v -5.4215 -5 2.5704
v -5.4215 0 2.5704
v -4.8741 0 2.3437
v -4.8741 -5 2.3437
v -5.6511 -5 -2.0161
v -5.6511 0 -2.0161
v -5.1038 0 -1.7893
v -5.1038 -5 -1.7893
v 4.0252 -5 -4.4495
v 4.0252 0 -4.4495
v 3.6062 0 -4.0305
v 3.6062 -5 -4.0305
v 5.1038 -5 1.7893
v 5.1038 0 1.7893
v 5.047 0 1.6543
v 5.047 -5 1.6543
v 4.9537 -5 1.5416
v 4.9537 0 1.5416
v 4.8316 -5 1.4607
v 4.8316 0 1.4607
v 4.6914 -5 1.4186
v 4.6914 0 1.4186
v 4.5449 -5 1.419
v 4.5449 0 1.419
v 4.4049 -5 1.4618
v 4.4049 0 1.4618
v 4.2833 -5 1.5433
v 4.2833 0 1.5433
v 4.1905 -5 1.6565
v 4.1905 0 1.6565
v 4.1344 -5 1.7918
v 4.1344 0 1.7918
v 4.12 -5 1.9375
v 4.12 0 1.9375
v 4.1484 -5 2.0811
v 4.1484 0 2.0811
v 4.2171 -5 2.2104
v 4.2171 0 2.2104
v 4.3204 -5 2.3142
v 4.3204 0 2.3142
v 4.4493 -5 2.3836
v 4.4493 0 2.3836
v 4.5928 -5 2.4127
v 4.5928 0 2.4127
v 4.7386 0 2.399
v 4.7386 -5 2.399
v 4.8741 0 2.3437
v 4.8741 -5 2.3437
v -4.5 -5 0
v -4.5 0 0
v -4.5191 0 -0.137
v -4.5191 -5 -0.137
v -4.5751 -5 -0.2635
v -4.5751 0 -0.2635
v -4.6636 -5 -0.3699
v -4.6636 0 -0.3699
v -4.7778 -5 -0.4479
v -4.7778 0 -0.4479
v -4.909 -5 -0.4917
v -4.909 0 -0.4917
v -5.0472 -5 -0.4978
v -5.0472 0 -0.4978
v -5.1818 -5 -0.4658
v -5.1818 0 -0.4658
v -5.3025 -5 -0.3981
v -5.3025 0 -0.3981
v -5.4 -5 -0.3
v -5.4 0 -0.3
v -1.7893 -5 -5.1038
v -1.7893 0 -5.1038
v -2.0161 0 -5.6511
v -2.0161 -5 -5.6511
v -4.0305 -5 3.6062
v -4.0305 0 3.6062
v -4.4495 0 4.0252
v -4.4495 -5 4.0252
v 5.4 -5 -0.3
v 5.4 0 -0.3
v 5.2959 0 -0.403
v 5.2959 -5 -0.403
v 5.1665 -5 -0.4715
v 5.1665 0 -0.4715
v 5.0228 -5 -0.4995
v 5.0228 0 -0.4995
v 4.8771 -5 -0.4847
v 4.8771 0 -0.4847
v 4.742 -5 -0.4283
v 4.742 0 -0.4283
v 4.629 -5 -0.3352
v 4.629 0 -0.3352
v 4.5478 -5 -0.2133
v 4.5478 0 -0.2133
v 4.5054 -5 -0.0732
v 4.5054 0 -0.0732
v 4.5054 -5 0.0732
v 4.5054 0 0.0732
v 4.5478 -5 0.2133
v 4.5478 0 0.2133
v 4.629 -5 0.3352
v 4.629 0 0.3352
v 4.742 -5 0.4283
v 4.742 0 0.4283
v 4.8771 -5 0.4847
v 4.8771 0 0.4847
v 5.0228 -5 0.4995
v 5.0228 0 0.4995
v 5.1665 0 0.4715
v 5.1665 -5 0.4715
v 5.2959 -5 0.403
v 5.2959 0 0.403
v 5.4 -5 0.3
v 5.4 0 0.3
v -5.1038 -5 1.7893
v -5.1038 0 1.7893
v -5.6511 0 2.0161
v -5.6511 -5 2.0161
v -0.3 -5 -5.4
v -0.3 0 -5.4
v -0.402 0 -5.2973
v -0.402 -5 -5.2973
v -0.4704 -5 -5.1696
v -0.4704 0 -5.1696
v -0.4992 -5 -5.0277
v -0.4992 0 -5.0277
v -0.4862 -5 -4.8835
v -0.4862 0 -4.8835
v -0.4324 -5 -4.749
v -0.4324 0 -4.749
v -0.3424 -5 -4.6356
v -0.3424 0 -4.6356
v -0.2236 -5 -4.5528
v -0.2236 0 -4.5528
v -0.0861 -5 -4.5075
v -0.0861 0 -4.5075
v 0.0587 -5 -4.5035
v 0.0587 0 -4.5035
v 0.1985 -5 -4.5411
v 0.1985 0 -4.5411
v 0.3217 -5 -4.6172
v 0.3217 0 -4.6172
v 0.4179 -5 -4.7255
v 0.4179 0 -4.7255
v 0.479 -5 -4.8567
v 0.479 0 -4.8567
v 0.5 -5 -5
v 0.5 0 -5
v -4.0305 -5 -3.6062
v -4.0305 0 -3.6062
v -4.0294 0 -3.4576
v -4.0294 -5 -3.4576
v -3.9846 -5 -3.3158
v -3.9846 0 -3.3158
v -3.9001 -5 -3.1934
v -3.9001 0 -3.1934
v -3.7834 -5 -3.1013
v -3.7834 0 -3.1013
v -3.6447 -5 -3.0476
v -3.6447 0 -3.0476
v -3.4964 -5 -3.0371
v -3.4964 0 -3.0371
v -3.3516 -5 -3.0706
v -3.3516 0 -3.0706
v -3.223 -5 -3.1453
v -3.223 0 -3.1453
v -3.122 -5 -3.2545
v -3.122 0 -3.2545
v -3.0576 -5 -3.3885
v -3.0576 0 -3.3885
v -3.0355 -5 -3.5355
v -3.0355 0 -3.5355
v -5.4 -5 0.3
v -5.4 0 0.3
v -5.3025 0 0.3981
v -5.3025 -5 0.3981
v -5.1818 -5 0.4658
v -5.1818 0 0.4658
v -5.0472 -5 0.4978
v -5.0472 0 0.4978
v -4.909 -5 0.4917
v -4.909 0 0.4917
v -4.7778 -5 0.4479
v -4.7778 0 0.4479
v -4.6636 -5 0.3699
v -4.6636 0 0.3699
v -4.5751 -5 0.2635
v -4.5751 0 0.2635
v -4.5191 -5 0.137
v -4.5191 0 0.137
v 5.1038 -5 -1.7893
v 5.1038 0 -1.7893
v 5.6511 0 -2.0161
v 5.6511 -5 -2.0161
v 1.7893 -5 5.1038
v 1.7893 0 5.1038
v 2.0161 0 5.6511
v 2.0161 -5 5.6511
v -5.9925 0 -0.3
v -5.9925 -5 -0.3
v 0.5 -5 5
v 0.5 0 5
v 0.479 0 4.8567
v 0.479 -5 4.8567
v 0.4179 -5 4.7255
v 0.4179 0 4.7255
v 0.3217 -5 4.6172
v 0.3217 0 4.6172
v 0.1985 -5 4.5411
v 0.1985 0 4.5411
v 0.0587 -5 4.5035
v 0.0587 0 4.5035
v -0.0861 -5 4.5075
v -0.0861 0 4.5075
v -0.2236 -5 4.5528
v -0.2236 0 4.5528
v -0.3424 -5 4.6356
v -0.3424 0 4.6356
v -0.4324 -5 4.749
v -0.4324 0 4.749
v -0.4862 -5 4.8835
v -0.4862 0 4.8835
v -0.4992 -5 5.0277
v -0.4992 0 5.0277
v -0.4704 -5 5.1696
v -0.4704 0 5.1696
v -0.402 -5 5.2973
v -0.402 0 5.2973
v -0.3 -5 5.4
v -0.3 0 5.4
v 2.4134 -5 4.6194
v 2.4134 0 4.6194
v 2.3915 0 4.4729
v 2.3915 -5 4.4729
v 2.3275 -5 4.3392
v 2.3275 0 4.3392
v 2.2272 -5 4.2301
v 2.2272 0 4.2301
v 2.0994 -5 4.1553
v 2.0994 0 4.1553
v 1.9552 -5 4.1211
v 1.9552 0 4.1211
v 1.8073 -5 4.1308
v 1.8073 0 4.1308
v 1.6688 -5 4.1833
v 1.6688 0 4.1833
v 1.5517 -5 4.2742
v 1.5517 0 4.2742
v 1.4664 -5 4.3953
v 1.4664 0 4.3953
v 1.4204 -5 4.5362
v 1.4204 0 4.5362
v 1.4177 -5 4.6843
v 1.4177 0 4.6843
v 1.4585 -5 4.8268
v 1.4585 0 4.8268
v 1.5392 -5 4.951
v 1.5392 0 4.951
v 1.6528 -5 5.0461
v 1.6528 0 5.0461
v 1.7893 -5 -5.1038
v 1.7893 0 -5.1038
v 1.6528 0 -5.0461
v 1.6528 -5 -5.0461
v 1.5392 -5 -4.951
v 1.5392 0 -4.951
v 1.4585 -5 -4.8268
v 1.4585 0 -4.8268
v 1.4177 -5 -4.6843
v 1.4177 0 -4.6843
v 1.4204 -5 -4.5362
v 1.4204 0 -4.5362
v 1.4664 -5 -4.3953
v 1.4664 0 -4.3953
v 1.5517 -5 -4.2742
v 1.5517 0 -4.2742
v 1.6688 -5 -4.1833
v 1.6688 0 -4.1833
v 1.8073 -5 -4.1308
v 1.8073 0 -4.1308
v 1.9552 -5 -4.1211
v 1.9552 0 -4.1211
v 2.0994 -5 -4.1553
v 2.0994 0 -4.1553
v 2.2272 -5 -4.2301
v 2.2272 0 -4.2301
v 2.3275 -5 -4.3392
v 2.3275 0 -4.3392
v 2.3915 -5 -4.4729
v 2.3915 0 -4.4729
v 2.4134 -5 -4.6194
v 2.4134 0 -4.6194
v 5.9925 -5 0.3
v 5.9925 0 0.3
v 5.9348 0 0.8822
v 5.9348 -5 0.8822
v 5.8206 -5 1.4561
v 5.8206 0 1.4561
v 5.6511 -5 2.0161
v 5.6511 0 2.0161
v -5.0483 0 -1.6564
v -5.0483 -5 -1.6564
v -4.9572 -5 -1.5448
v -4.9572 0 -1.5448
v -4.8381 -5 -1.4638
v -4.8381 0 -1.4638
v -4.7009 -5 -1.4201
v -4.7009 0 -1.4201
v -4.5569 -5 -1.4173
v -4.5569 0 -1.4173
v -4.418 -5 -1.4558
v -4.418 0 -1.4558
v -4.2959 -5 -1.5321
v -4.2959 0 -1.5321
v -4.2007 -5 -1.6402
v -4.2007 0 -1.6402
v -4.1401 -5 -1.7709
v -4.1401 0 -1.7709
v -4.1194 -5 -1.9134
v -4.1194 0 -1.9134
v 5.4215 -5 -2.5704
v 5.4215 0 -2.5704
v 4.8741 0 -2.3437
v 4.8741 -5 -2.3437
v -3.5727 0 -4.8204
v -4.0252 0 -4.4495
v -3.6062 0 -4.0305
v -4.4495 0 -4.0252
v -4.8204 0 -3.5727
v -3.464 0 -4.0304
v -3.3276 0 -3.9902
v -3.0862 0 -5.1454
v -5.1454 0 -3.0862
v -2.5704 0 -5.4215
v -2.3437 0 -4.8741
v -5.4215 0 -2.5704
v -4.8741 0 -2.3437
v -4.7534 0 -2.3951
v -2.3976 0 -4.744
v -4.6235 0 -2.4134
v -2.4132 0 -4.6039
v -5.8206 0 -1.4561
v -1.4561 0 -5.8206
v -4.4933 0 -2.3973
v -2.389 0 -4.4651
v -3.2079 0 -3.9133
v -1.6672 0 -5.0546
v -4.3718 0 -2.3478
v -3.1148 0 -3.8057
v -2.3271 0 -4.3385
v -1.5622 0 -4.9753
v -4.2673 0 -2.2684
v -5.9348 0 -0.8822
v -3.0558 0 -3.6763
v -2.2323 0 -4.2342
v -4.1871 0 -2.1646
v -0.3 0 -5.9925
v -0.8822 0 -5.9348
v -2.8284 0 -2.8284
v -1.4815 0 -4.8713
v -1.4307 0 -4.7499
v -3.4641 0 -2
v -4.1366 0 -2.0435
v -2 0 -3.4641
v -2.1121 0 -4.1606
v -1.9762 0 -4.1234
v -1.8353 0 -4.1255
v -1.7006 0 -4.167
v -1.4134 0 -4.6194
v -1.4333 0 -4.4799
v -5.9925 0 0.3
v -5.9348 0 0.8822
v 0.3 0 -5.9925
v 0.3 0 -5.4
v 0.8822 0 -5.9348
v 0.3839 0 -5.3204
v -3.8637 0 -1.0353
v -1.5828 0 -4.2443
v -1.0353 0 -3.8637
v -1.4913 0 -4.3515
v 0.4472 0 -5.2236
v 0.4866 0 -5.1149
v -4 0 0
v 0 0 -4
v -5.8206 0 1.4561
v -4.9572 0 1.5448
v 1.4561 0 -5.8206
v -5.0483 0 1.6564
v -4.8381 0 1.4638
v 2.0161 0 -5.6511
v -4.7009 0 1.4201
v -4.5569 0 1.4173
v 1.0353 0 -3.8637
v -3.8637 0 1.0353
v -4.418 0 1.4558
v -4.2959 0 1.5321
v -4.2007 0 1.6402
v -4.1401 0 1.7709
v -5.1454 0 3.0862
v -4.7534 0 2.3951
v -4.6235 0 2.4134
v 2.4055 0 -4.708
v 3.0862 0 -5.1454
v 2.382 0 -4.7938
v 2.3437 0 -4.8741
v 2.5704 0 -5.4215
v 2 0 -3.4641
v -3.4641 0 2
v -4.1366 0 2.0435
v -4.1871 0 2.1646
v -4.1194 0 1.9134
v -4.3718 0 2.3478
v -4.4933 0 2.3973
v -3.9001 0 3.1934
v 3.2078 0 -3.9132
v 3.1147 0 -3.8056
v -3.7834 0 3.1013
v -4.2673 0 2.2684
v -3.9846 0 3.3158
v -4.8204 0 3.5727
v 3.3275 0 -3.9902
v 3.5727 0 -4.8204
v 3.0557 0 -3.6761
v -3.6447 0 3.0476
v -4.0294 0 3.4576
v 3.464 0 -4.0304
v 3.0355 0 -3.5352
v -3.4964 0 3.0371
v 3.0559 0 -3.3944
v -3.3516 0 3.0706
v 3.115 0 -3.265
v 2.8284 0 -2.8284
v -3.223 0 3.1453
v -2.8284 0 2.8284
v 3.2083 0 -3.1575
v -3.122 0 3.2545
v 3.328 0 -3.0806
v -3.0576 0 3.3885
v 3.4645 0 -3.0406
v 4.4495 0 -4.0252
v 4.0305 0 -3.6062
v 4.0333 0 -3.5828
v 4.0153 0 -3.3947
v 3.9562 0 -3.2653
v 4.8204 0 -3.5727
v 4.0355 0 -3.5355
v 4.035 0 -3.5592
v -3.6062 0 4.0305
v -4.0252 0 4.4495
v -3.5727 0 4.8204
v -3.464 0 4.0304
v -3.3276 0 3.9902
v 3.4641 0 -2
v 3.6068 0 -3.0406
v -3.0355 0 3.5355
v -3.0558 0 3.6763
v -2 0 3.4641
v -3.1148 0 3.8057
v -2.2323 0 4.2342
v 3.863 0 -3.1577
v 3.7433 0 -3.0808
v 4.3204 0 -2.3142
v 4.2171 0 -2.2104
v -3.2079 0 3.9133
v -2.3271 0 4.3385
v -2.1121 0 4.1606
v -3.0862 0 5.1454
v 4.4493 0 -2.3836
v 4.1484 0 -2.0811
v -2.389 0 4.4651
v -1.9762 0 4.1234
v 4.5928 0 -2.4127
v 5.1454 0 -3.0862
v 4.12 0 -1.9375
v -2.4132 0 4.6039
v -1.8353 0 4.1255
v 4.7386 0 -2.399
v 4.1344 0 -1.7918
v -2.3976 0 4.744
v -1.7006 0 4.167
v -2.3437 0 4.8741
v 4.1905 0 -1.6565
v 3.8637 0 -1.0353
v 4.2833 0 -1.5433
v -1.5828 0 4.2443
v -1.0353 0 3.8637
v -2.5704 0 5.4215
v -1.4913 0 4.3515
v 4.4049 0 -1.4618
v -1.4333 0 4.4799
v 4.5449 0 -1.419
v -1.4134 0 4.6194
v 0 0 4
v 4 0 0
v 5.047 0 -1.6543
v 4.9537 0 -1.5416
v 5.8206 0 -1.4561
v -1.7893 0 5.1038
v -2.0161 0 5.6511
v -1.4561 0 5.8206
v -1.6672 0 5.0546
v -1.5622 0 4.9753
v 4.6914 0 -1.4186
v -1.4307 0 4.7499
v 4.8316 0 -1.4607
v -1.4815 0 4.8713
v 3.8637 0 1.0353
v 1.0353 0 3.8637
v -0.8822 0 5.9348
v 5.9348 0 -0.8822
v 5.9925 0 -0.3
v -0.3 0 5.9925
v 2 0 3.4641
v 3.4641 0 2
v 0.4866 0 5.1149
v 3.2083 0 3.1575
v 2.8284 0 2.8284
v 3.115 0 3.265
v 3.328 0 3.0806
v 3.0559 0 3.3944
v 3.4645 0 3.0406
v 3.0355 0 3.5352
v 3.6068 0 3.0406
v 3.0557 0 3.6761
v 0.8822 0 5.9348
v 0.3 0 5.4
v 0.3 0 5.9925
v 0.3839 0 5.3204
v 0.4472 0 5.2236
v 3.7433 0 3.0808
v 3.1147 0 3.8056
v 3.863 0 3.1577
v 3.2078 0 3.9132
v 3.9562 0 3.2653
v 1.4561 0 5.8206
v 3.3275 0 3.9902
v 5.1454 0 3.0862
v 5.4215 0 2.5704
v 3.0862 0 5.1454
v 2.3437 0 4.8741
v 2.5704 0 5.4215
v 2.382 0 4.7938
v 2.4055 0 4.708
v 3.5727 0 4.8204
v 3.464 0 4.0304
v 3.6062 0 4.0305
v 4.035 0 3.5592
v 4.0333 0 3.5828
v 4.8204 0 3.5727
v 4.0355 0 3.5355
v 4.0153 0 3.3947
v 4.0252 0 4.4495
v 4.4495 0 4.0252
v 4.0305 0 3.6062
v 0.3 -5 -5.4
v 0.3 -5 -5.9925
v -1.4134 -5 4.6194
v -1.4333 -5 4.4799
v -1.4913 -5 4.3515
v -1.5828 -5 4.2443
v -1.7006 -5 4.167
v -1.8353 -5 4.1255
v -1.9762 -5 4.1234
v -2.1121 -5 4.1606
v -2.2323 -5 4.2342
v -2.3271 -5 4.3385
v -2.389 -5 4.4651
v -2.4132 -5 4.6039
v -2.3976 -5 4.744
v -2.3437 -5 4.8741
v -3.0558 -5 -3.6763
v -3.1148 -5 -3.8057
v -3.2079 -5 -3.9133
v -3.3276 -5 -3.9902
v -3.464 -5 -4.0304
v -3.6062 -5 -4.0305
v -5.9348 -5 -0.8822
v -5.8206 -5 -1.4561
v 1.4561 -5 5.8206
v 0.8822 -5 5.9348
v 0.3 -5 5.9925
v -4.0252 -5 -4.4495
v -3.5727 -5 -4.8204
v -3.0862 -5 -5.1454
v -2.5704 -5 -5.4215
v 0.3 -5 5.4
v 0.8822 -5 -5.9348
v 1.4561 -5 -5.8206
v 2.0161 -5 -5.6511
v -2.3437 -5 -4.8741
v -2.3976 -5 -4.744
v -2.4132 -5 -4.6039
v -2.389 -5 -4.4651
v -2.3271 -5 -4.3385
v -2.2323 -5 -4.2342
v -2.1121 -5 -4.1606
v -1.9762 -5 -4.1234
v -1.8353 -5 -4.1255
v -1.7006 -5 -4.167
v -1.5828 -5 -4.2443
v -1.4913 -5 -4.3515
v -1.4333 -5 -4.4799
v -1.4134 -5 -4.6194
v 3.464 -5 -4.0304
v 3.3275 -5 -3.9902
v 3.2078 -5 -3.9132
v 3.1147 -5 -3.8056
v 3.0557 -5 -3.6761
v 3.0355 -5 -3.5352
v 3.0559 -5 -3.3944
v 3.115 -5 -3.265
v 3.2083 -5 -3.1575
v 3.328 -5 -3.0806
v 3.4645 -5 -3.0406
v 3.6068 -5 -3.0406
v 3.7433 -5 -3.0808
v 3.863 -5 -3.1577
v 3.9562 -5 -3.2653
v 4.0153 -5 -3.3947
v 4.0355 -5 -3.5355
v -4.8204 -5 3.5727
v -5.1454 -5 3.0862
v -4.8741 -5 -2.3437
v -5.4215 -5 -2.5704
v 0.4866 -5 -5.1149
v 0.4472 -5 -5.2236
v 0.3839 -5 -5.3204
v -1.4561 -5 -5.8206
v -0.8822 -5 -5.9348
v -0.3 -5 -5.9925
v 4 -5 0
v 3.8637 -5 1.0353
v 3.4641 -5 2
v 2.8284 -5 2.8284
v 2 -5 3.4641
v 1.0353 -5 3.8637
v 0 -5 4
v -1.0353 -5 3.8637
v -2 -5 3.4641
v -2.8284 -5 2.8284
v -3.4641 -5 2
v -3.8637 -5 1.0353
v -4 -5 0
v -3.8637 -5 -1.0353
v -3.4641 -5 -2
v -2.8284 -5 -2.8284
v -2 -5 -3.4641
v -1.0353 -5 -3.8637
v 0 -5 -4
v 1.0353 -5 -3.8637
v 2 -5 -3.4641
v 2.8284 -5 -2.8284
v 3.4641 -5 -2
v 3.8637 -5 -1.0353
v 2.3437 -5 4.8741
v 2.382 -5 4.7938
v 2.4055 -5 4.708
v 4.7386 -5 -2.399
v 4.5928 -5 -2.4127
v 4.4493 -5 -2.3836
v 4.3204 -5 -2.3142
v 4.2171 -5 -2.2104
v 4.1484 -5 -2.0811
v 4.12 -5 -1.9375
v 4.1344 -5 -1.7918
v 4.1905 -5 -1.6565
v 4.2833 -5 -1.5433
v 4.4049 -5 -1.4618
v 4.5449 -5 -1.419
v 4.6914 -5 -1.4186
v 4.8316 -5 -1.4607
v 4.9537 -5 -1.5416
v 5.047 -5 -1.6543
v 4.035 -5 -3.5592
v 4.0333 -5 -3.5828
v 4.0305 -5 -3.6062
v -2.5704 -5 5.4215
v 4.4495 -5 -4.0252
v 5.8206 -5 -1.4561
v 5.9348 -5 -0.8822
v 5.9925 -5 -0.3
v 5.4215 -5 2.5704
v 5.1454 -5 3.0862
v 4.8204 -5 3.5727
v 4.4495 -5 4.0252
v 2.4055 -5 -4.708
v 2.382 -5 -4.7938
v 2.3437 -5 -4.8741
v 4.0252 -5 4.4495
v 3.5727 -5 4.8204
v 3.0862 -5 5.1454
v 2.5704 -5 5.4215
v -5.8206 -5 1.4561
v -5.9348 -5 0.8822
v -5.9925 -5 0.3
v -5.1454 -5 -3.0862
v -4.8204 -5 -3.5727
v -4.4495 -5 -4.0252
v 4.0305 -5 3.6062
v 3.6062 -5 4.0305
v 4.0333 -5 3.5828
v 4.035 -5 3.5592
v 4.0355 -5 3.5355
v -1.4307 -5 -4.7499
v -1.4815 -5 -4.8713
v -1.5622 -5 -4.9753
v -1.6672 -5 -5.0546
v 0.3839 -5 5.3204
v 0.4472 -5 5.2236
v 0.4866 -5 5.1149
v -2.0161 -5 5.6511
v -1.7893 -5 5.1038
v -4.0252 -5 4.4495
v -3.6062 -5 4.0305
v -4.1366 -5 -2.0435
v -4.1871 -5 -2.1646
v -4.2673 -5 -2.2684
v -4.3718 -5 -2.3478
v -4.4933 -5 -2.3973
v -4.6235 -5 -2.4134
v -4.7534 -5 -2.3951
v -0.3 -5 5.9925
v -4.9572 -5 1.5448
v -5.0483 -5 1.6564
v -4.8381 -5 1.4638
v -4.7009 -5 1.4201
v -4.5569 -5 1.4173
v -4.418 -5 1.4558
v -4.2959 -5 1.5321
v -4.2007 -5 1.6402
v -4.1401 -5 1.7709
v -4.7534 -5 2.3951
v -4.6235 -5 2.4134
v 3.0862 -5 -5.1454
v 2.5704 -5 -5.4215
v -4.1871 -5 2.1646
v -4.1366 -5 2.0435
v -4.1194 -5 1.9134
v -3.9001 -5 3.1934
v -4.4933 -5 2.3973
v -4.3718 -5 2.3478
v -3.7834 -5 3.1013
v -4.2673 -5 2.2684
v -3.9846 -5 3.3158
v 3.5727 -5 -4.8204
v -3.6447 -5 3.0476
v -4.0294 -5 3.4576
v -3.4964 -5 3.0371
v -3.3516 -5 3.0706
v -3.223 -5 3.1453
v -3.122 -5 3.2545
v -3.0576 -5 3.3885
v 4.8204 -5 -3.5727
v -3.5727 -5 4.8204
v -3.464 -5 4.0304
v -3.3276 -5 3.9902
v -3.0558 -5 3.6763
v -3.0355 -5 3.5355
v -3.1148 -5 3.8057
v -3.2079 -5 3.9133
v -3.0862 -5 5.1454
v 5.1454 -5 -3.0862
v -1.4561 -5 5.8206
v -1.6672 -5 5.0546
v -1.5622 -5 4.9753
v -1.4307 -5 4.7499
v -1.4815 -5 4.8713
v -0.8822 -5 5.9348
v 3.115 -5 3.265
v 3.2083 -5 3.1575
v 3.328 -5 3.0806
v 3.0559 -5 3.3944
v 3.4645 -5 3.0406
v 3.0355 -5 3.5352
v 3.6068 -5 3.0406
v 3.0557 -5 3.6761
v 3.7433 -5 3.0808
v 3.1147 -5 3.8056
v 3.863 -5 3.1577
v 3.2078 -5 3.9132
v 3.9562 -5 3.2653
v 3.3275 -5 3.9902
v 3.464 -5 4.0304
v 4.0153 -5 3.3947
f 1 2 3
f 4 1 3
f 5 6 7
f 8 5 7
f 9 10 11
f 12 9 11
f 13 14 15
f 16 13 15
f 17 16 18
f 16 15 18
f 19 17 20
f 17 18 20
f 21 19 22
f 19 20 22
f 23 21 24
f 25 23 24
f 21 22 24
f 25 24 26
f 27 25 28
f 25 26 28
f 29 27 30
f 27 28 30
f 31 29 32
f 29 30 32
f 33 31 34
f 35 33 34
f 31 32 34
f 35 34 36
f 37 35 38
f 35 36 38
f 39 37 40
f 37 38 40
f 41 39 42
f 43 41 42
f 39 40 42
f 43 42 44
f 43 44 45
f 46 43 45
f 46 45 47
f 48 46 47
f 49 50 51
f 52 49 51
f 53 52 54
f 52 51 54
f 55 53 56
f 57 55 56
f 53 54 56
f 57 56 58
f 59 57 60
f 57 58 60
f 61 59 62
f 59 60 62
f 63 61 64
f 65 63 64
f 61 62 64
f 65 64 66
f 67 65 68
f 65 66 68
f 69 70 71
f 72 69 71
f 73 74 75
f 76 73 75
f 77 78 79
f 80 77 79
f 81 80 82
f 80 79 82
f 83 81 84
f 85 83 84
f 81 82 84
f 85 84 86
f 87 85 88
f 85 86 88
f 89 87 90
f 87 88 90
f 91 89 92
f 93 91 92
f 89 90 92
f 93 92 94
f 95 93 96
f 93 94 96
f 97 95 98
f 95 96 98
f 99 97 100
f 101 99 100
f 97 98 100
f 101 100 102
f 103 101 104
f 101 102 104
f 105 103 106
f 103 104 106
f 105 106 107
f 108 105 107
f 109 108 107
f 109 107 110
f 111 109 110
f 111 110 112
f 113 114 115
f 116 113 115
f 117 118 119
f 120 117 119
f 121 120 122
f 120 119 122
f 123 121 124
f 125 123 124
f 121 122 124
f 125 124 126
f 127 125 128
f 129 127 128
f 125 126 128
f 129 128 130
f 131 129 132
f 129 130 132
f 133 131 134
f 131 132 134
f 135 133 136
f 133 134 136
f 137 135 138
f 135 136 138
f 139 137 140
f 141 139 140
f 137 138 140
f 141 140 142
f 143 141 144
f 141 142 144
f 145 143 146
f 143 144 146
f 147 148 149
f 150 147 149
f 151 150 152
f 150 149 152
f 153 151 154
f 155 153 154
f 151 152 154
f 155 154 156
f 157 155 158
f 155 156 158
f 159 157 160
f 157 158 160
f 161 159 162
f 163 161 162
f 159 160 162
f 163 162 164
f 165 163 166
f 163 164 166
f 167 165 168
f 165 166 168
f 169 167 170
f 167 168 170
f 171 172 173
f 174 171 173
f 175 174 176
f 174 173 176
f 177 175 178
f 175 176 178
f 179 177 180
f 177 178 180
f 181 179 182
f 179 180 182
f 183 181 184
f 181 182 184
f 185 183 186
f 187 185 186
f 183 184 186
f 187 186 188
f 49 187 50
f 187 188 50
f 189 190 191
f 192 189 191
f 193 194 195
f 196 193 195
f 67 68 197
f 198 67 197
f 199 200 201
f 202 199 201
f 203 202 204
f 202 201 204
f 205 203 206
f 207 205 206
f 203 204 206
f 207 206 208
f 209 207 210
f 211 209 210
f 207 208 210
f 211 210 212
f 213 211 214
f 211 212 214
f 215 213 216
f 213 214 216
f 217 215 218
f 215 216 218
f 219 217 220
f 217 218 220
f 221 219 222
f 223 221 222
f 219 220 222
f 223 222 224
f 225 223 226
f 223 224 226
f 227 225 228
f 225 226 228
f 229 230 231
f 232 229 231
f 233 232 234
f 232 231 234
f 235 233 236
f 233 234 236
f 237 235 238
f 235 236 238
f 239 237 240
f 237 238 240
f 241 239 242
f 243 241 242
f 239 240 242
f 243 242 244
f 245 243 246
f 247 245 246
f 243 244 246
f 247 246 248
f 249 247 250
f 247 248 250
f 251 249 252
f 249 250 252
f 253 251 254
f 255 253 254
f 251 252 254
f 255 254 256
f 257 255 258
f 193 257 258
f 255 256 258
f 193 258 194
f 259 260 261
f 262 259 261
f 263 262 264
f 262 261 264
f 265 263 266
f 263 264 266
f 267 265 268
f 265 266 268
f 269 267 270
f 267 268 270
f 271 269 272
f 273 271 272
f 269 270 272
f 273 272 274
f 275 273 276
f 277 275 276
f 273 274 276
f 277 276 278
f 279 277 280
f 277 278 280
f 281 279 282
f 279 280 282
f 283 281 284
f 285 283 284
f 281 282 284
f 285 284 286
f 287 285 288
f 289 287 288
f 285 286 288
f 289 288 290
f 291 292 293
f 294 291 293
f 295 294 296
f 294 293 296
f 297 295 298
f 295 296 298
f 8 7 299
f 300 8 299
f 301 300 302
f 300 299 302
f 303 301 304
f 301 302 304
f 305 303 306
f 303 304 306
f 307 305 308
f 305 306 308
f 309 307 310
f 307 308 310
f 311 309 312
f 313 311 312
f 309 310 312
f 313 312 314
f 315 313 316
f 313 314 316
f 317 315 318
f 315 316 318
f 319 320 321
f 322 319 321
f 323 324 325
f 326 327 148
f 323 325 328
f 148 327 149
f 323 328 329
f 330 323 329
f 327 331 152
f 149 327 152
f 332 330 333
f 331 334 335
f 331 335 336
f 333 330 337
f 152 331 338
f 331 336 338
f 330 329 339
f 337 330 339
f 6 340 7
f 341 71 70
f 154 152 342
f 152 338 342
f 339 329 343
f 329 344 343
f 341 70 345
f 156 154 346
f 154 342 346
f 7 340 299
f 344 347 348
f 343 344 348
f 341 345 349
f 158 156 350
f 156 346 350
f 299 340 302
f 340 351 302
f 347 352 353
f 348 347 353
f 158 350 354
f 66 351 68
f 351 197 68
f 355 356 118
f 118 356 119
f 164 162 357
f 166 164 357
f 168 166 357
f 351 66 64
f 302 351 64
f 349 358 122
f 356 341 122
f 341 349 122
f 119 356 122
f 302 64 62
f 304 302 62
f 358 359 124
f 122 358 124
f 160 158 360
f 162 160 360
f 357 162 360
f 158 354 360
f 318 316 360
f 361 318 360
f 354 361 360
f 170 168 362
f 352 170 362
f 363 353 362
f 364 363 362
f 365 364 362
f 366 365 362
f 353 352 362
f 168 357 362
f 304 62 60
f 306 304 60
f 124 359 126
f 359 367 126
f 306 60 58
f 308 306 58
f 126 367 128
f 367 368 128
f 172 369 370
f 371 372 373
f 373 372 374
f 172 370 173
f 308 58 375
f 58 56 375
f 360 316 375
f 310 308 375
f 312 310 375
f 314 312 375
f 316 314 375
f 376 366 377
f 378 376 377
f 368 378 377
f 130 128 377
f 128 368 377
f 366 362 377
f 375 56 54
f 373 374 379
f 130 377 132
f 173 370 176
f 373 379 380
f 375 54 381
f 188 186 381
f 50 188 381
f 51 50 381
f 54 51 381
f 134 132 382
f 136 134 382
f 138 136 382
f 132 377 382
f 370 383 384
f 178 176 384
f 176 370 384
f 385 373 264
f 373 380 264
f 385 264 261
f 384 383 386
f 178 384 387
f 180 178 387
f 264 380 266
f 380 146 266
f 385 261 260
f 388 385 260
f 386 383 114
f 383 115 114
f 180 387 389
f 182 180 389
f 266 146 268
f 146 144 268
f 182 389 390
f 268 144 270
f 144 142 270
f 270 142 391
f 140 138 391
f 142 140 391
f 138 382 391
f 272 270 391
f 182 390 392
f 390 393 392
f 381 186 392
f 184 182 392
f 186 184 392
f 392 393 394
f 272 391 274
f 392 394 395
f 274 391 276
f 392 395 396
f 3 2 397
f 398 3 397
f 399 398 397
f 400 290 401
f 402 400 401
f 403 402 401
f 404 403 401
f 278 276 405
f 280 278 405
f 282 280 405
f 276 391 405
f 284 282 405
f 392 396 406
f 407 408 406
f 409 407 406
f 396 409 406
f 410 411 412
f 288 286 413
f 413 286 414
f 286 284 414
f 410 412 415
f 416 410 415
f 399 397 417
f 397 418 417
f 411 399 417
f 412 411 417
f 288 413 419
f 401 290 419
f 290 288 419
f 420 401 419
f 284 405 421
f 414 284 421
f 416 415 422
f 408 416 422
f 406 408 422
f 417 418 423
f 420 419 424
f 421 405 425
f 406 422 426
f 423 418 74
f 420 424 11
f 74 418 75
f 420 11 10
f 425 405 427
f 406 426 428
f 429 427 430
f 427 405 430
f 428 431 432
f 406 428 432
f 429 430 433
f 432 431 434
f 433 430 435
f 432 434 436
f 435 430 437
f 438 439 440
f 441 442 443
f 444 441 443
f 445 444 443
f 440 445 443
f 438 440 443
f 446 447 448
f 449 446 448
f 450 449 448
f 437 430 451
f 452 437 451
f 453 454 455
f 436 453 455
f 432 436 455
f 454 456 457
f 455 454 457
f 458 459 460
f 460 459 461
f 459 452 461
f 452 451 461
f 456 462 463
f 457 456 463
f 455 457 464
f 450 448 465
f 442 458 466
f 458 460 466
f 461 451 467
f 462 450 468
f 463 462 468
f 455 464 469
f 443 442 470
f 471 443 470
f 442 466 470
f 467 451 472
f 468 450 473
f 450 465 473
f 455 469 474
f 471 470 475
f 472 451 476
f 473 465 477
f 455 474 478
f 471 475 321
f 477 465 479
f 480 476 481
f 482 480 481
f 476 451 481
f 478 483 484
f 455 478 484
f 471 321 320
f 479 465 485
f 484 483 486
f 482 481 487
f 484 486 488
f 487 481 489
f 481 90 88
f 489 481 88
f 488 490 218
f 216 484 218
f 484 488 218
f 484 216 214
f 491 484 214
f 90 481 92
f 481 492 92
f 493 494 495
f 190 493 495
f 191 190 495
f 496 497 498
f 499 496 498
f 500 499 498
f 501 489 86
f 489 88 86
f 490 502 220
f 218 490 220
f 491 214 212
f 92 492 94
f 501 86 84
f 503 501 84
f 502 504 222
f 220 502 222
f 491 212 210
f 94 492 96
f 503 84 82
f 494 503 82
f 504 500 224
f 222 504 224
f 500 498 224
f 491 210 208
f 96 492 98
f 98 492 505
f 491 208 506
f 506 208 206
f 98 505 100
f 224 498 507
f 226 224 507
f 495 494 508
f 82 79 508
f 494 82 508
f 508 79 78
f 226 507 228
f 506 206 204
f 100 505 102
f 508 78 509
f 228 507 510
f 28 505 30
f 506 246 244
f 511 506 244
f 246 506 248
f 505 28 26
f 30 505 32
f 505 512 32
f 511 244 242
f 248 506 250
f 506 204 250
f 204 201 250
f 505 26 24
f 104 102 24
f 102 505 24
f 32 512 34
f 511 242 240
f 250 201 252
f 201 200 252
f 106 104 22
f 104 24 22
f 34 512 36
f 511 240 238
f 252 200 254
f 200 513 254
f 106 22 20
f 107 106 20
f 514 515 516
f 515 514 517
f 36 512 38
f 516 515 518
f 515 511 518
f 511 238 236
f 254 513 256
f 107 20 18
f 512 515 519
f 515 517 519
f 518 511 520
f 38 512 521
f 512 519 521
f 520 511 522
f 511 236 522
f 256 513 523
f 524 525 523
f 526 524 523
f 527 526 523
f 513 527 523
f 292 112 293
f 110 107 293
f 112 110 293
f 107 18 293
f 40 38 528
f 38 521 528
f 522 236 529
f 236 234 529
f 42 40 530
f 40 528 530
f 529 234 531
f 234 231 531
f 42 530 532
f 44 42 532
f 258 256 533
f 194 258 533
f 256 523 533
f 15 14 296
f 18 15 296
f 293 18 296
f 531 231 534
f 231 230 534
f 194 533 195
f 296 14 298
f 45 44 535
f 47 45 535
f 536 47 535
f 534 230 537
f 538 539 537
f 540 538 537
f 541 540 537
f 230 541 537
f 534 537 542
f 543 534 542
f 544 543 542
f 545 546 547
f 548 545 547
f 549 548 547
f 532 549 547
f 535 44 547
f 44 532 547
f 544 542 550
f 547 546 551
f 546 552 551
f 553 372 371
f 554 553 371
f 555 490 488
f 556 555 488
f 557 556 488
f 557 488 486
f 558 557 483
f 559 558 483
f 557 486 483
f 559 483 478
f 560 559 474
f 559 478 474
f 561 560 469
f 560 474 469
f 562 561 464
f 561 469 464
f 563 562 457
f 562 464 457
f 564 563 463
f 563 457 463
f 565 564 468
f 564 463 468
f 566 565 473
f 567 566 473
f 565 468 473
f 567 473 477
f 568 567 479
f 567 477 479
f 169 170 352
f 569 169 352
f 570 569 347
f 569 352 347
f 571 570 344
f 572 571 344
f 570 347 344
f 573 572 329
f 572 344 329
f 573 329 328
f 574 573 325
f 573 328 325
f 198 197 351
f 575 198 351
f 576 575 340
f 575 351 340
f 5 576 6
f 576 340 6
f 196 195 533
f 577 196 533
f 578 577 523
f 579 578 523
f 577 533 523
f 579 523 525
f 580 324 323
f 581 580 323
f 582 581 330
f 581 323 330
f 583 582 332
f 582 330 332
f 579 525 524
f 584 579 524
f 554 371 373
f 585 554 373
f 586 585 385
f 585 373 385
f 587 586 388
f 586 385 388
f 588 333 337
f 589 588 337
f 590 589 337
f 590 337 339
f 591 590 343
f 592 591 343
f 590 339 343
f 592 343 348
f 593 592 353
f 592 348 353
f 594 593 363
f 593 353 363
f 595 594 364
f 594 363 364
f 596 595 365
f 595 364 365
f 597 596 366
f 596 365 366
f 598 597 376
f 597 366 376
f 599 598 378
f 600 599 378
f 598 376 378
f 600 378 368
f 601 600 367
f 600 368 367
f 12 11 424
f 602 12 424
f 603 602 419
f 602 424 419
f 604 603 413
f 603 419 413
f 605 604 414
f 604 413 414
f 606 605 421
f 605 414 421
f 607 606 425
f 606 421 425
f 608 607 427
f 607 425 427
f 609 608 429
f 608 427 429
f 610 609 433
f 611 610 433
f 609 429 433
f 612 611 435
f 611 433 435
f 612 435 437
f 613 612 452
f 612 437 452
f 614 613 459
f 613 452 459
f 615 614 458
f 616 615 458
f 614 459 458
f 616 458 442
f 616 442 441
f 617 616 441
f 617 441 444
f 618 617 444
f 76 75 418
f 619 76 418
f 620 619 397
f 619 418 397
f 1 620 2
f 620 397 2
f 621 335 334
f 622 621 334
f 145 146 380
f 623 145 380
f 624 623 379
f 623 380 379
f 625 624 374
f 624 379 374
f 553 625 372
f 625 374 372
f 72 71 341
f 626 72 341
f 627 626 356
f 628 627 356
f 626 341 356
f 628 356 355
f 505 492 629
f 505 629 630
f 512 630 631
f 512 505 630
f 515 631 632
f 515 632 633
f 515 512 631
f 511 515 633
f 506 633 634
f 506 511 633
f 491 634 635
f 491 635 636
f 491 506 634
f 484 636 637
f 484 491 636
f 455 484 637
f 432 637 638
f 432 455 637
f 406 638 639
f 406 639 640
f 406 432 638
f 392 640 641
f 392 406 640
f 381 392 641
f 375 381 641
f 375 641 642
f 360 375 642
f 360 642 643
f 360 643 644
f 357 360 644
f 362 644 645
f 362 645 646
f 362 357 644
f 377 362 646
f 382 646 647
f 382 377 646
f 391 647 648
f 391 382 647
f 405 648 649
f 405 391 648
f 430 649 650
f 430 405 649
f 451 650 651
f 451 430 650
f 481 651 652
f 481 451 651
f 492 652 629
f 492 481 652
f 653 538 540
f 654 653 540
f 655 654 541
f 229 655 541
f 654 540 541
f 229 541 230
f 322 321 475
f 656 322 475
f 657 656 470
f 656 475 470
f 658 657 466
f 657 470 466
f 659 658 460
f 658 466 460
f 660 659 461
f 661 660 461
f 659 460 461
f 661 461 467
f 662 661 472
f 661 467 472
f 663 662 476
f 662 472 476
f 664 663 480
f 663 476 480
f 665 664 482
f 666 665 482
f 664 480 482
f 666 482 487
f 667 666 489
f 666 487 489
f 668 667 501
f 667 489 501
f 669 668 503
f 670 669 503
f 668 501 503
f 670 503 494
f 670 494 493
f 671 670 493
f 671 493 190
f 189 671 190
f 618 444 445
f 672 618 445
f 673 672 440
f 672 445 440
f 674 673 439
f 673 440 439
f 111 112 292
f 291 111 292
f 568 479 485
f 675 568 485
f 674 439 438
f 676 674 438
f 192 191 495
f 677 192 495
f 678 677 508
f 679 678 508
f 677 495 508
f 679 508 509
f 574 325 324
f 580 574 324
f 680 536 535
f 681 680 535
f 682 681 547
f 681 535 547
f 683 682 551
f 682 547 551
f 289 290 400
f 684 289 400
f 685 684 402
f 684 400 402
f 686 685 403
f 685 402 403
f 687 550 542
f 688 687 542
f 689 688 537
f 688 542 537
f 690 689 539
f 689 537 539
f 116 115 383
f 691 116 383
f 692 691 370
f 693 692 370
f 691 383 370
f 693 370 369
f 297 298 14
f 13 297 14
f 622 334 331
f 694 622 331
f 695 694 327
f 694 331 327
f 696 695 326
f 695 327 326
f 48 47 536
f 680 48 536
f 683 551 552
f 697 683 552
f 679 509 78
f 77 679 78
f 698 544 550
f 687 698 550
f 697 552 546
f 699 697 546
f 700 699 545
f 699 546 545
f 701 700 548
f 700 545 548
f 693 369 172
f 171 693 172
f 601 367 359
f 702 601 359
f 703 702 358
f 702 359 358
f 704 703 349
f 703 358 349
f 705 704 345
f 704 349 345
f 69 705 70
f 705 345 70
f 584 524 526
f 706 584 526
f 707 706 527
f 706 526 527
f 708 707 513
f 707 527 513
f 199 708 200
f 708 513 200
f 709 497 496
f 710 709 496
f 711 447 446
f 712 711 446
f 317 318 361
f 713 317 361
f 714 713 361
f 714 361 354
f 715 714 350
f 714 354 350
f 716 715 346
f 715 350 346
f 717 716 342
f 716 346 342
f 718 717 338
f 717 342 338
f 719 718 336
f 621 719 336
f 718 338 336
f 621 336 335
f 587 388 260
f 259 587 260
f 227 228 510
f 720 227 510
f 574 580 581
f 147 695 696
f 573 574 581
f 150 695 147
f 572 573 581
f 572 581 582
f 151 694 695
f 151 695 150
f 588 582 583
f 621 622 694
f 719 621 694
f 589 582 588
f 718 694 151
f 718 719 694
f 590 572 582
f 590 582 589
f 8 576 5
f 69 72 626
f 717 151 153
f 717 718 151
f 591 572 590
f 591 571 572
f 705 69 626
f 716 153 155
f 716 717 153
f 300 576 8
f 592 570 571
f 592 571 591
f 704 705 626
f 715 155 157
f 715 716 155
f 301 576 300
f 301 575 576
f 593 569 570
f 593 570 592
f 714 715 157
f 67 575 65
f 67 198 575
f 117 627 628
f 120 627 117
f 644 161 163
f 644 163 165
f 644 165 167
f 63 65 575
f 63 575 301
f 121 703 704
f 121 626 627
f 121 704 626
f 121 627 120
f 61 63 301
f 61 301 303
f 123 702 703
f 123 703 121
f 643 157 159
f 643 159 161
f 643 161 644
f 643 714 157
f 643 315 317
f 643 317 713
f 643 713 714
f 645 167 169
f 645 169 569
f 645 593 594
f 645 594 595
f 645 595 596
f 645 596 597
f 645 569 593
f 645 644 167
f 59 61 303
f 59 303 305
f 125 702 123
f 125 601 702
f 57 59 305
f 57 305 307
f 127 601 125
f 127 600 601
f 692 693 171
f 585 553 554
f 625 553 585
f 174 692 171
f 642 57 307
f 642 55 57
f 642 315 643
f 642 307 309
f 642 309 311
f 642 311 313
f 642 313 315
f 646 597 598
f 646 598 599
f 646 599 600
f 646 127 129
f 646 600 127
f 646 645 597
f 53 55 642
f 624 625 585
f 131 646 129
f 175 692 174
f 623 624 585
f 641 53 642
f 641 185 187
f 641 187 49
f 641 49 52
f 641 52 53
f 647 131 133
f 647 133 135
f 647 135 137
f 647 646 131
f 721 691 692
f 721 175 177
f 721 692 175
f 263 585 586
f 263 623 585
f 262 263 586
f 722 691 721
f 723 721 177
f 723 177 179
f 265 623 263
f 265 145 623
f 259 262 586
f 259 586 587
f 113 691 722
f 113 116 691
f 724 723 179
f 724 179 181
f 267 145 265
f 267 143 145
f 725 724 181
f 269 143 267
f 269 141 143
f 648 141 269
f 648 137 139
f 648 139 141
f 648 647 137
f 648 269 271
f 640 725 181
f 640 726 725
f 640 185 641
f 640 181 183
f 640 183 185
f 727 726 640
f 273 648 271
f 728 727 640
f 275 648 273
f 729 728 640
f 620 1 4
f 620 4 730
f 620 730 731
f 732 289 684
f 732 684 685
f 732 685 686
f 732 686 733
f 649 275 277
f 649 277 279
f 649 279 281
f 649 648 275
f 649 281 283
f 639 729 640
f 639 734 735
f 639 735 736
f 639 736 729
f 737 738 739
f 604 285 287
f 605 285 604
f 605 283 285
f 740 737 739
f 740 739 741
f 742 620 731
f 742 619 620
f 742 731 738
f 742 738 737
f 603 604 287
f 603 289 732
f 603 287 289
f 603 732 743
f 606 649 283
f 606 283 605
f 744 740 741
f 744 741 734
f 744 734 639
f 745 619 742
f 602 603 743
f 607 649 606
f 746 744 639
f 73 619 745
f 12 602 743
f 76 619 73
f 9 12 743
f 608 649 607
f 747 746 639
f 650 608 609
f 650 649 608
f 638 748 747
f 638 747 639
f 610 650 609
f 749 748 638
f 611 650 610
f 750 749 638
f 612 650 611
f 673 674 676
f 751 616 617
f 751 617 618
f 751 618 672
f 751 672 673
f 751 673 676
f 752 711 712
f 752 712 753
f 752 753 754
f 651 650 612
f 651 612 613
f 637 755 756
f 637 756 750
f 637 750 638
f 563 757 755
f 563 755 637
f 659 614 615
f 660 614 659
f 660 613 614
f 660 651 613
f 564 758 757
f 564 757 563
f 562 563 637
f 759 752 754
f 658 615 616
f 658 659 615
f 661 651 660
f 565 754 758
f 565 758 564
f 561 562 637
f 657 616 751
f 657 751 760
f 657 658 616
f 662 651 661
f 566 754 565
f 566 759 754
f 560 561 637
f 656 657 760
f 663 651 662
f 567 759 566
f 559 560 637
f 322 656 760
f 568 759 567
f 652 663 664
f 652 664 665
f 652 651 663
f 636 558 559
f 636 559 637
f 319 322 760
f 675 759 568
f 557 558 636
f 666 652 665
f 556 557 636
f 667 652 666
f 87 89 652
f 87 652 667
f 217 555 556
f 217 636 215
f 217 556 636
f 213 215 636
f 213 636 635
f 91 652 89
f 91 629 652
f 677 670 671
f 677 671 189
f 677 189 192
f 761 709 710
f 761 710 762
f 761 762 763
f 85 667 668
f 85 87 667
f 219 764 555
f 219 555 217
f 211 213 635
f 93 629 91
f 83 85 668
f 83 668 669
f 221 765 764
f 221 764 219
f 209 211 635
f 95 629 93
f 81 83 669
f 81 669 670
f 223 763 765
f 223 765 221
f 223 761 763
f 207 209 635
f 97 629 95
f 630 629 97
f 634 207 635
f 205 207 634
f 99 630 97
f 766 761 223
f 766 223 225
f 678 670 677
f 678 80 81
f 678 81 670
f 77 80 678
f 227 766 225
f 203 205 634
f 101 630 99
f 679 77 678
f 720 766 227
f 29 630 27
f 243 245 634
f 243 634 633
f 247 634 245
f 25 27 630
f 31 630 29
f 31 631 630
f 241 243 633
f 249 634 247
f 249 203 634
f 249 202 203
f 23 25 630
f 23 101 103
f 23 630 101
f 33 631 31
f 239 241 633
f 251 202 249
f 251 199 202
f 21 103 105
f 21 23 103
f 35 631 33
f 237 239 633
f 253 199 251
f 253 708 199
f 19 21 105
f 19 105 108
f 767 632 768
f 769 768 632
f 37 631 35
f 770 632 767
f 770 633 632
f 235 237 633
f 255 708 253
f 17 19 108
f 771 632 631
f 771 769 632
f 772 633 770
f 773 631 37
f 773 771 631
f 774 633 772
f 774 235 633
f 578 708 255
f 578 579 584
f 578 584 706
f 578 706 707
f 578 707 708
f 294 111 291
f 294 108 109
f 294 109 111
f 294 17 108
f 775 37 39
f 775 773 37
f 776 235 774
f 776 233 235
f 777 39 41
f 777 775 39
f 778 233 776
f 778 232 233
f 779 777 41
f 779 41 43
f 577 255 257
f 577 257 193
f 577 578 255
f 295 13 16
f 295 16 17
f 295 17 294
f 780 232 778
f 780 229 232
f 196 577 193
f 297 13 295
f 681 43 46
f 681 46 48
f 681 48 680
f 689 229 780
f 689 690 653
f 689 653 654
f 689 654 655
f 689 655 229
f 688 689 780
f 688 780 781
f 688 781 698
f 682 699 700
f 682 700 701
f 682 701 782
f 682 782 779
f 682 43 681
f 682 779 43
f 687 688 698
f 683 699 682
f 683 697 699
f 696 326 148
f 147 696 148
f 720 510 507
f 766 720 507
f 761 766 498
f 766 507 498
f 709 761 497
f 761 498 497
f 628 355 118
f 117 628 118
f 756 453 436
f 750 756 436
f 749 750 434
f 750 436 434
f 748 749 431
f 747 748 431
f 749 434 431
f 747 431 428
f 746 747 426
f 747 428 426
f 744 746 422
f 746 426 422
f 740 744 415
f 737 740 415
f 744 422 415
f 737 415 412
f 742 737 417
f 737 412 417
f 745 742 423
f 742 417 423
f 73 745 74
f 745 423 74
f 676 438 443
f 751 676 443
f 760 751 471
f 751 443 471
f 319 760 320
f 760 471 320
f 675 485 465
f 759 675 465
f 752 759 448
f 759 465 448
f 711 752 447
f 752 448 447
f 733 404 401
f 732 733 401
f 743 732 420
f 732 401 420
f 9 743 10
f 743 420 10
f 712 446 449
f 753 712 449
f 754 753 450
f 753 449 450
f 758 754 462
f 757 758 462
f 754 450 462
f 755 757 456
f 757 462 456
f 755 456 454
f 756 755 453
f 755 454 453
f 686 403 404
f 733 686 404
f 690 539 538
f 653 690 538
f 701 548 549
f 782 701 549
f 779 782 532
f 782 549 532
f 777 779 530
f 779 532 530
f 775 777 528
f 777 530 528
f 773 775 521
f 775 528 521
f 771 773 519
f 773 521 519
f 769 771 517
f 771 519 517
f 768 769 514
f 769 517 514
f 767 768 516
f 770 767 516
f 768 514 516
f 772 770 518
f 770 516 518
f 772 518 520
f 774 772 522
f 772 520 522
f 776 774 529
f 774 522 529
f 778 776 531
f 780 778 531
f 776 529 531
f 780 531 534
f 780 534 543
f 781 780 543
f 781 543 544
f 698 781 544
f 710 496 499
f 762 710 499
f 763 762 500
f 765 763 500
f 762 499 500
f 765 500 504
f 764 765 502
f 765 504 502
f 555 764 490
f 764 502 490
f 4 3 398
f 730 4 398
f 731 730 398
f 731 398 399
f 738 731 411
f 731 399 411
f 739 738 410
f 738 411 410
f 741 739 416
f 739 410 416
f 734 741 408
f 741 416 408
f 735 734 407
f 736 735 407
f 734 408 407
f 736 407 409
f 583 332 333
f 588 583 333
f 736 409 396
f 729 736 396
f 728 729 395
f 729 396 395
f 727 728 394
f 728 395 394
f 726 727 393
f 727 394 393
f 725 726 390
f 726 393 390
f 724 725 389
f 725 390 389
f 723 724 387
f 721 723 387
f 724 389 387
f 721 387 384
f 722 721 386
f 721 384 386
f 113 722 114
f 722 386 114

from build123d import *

# Parameters (mm, degrees)
F0_R     = 4
F1_DEPTH = 5


with BuildPart() as f1:
    # F0 (on Front) → F1 (new body)
    with BuildSketch(Plane.XZ):
        with BuildLine():
            Line((5.4, 0.3), (5.992495, 0.3))
            ThreePointArc((5.992495, 0.3), (5.884712, 1.170542), (5.651149, 2.016065))
            Line((5.651149, 2.016065), (5.103755, 1.789327))
            ThreePointArc((5.103755, 1.789327), (4.157458, 1.722075), (4.874144, 2.343654))
            Line((4.874144, 2.343654), (5.421539, 2.570393))
            ThreePointArc((5.421539, 2.570393), (4.988818, 3.333421), (4.449466, 4.025202))
            Line((4.449466, 4.025202), (4.030509, 3.606245))
            ThreePointArc((4.030509, 3.606245), (4.034276, 3.570978), (4.035534, 3.535534))
            ThreePointArc((4.035534, 3.535534), (3.157807, 3.207933), (3.606245, 4.030509))
            Line((3.606245, 4.030509), (4.025202, 4.449466))
            ThreePointArc((4.025202, 4.449466), (3.333421, 4.988818), (2.570393, 5.421539))
            Line((2.570393, 5.421539), (2.343654, 4.874144))
            ThreePointArc((2.343654, 4.874144), (2.395661, 4.751461), (2.413417, 4.619398))
            ThreePointArc((2.413417, 4.619398), (1.60686, 4.224401), (1.789327, 5.103755))
            Line((1.789327, 5.103755), (2.016065, 5.651149))
            ThreePointArc((2.016065, 5.651149), (1.170542, 5.884712), (0.3, 5.992495))
            Line((0.3, 5.992495), (0.3, 5.4))
            ThreePointArc((0.3, 5.4), (0.447214, 5.223607), (0.5, 5))
            ThreePointArc((0.5, 5), (-0.223607, 4.552786), (-0.3, 5.4))
            Line((-0.3, 5.4), (-0.3, 5.992495))
            ThreePointArc((-0.3, 5.992495), (-1.170542, 5.884712), (-2.016065, 5.651149))
            Line((-2.016065, 5.651149), (-1.789327, 5.103755))
            ThreePointArc((-1.789327, 5.103755), (-1.51842, 4.925955), (-1.413417, 4.619398))
            ThreePointArc((-1.413417, 4.619398), (-2.04548, 4.137154), (-2.343654, 4.874144))
            Line((-2.343654, 4.874144), (-2.570393, 5.421539))
            ThreePointArc((-2.570393, 5.421539), (-3.333421, 4.988818), (-4.025202, 4.449466))
            Line((-4.025202, 4.449466), (-3.606245, 4.030509))
            ThreePointArc((-3.606245, 4.030509), (-3.207933, 3.913261), (-3.035534, 3.535534))
            ThreePointArc((-3.035534, 3.535534), (-3.570978, 3.036792), (-4.030509, 3.606245))
            Line((-4.030509, 3.606245), (-4.449466, 4.025202))
            ThreePointArc((-4.449466, 4.025202), (-4.988818, 3.333421), (-5.421539, 2.570393))
            Line((-5.421539, 2.570393), (-4.874144, 2.343654))
            ThreePointArc((-4.874144, 2.343654), (-4.371782, 2.347798), (-4.119398, 1.913417))
            ThreePointArc((-4.119398, 1.913417), (-4.556861, 1.417343), (-5.103755, 1.789327))
            Line((-5.103755, 1.789327), (-5.651149, 2.016065))
            ThreePointArc((-5.651149, 2.016065), (-5.884712, 1.170542), (-5.992495, 0.3))
            Line((-5.992495, 0.3), (-5.4, 0.3))
            ThreePointArc((-5.4, 0.3), (-4.841886, 0.474342), (-4.5, 0))
            ThreePointArc((-4.5, 0), (-4.841886, -0.474342), (-5.4, -0.3))
            Line((-5.4, -0.3), (-5.992495, -0.3))
            ThreePointArc((-5.992495, -0.3), (-5.884712, -1.170542), (-5.651149, -2.016065))
            Line((-5.651149, -2.016065), (-5.103755, -1.789327))
            ThreePointArc((-5.103755, -1.789327), (-4.556861, -1.417343), (-4.119398, -1.913417))
            ThreePointArc((-4.119398, -1.913417), (-4.371782, -2.347798), (-4.874144, -2.343654))
            Line((-4.874144, -2.343654), (-5.421539, -2.570393))
            ThreePointArc((-5.421539, -2.570393), (-4.988818, -3.333421), (-4.449466, -4.025202))
            Line((-4.449466, -4.025202), (-4.030509, -3.606245))
            ThreePointArc((-4.030509, -3.606245), (-3.570978, -3.036792), (-3.035534, -3.535534))
            ThreePointArc((-3.035534, -3.535534), (-3.207933, -3.913261), (-3.606245, -4.030509))
            Line((-3.606245, -4.030509), (-4.025202, -4.449466))
            ThreePointArc((-4.025202, -4.449466), (-3.333421, -4.988818), (-2.570393, -5.421539))
            Line((-2.570393, -5.421539), (-2.343654, -4.874144))
            ThreePointArc((-2.343654, -4.874144), (-2.04548, -4.137154), (-1.413417, -4.619398))
            ThreePointArc((-1.413417, -4.619398), (-1.51842, -4.925955), (-1.789327, -5.103755))
            Line((-1.789327, -5.103755), (-2.016065, -5.651149))
            ThreePointArc((-2.016065, -5.651149), (-1.170542, -5.884712), (-0.3, -5.992495))
            Line((-0.3, -5.992495), (-0.3, -5.4))
            ThreePointArc((-0.3, -5.4), (-0.223607, -4.552786), (0.5, -5))
            ThreePointArc((0.5, -5), (0.447214, -5.223607), (0.3, -5.4))
            Line((0.3, -5.4), (0.3, -5.992495))
            ThreePointArc((0.3, -5.992495), (1.170542, -5.884712), (2.016065, -5.651149))
            Line((2.016065, -5.651149), (1.789327, -5.103755))
            ThreePointArc((1.789327, -5.103755), (1.60686, -4.224401), (2.413417, -4.619398))
            ThreePointArc((2.413417, -4.619398), (2.395661, -4.751461), (2.343654, -4.874144))
            Line((2.343654, -4.874144), (2.570393, -5.421539))
            ThreePointArc((2.570393, -5.421539), (3.333421, -4.988818), (4.025202, -4.449466))
            Line((4.025202, -4.449466), (3.606245, -4.030509))
            ThreePointArc((3.606245, -4.030509), (3.157807, -3.207933), (4.035534, -3.535534))
            ThreePointArc((4.035534, -3.535534), (4.034276, -3.570978), (4.030509, -3.606245))
            Line((4.030509, -3.606245), (4.449466, -4.025202))
            ThreePointArc((4.449466, -4.025202), (4.988818, -3.333421), (5.421539, -2.570393))
            Line((5.421539, -2.570393), (4.874144, -2.343654))
            ThreePointArc((4.874144, -2.343654), (4.157458, -1.722075), (5.103755, -1.789327))
            Line((5.103755, -1.789327), (5.651149, -2.016065))
            ThreePointArc((5.651149, -2.016065), (5.884712, -1.170542), (5.992495, -0.3))
            Line((5.992495, -0.3), (5.4, -0.3))
            ThreePointArc((5.4, -0.3), (4.5, 0), (5.4, 0.3))
        make_face()
        Circle(F0_R, mode=Mode.SUBTRACT)
    extrude(amount=F1_DEPTH)


solid = f1.part
